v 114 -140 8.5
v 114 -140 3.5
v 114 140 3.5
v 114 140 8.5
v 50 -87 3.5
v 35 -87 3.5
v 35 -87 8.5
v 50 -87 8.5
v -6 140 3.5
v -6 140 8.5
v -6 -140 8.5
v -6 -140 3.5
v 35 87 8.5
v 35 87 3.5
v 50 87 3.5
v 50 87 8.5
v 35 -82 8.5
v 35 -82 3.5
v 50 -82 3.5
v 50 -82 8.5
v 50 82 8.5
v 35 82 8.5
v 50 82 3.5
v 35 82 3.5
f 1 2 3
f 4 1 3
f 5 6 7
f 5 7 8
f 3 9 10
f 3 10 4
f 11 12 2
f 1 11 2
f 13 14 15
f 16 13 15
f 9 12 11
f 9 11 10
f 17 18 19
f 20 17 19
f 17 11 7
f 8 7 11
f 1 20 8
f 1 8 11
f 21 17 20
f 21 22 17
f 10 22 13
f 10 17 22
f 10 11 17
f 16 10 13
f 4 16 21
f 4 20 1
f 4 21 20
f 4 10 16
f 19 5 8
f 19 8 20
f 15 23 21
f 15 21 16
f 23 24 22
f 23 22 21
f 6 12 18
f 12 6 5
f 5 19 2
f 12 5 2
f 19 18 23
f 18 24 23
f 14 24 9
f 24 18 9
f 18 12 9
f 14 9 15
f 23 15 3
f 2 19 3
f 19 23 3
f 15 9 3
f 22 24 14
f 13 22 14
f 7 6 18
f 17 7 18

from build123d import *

# Parameters (mm, degrees)
BOX005_W     = 15
BOX005_H     = 5
BOX005_DEPTH = 16
BOX004_W     = 15
BOX004_H     = 5
BOX004_DEPTH = 16
BOX_W        = 120
BOX_H        = 280
BOX_DEPTH    = 5


with BuildPart() as cubo004:
    # Box005 → Box005 (new body)
    with BuildSketch(Plane(origin=(35, 82, 69), x_dir=(1, 0, 0), z_dir=(0, 0, 1))):
        with Locations((7.5, 2.5)):
            Rectangle(BOX005_W, BOX005_H)
    extrude(amount=BOX005_DEPTH)


with BuildPart() as cubo003:
    # Box004 → Box004 (new body)
    with BuildSketch(Plane(origin=(35, -87, 68), x_dir=(1, 0, 0), z_dir=(0, 0, 1))):
        with Locations((7.5, 2.5)):
            Rectangle(BOX004_W, BOX004_H)
    extrude(amount=BOX004_DEPTH)


with BuildPart() as tabla_cortes:
    # Box → Box (new body)
    with BuildSketch(Plane(origin=(-6, -140, 73.5), x_dir=(1, 0, 0), z_dir=(0, 0, 1))):
        with Locations((60, 140)):
            Rectangle(BOX_W, BOX_H)
    extrude(amount=BOX_DEPTH)

    # Cut003: cut Cubo003
    add(cubo003.part, mode=Mode.SUBTRACT)

    # Cut004: cut Cubo004
    add(cubo004.part, mode=Mode.SUBTRACT)


with BuildPart() as tabla_cortes_1:
    # Cut004 placement: moved
    add(tabla_cortes.part.moved(Location((0, 0, -70))))


solid = tabla_cortes_1.part
